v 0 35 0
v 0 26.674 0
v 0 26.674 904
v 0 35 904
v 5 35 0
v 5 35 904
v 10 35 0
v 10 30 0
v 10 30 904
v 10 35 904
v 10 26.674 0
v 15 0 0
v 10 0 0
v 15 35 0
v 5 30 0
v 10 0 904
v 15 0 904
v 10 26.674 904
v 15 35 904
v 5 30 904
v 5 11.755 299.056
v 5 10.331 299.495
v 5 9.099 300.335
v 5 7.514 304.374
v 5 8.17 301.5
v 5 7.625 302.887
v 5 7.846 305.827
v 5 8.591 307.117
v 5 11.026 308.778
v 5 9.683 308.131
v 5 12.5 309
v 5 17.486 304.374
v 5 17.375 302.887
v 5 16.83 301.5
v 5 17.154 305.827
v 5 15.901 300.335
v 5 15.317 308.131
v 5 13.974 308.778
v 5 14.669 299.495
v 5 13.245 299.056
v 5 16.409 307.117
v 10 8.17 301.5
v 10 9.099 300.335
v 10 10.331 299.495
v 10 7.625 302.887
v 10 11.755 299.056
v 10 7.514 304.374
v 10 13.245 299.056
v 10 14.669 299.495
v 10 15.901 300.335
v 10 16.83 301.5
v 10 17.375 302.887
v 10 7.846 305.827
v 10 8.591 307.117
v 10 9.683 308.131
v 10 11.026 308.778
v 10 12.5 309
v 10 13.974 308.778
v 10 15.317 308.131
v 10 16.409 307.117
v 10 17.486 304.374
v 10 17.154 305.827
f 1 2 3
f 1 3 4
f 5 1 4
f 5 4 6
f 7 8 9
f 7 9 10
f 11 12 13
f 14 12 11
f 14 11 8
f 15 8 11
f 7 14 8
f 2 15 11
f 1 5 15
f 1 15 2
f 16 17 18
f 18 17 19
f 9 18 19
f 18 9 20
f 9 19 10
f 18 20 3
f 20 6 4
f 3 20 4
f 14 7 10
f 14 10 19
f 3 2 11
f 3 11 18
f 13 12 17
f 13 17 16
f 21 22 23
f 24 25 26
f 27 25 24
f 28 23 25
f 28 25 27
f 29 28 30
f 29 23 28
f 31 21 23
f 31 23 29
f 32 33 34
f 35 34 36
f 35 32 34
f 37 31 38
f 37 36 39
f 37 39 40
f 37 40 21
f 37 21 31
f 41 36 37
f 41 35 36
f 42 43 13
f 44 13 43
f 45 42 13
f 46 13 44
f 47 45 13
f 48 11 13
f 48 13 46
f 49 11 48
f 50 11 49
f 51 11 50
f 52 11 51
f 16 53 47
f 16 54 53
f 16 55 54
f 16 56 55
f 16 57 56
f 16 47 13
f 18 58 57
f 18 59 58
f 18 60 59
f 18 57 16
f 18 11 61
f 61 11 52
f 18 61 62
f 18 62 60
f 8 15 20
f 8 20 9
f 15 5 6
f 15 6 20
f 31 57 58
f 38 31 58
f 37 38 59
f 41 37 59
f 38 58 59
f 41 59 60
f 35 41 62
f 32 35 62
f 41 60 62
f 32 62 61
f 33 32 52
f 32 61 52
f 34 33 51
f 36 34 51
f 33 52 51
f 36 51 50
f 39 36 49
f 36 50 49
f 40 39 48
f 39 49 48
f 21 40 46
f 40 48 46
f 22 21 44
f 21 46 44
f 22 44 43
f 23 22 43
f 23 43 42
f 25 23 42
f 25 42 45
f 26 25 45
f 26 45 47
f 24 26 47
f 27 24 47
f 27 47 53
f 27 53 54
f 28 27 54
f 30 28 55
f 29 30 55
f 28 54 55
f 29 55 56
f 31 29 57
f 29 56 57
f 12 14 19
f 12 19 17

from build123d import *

# Parameters (mm, degrees)
BOSS_EXTRUDE1_DEPTH = 904
SKETCH4_W           = 904
SKETCH4_H           = 26.674416974
CUT_EXTRUDE3_DEPTH  = 10
SKETCH7_R           = 5
BOSS_EXTRUDE4_DEPTH = 5


with BuildPart() as part:
    # Sketch1 → Boss-Extrude1 (new body)
    with BuildSketch(Plane.XY):
        Polygon((0, 35), (5, 35), (5, 30), (10, 30), (10, 35), (15, 35), (15, 0), (0, 0), align=None)
    extrude(amount=BOSS_EXTRUDE1_DEPTH)

    # Sketch4 → Cut-Extrude3 (cut)
    with BuildSketch(Plane.ZY):
        with Locations((452, 13.337208487)):
            Rectangle(SKETCH4_W, SKETCH4_H)
    extrude(amount=-CUT_EXTRUDE3_DEPTH, mode=Mode.SUBTRACT)

    # Sketch7 → Boss-Extrude4 (add)
    with BuildSketch(Plane.ZY.offset(-10)):
        with Locations((304, 12.5)):
            Circle(SKETCH7_R)
    extrude(amount=BOSS_EXTRUDE4_DEPTH)


solid = part.part
